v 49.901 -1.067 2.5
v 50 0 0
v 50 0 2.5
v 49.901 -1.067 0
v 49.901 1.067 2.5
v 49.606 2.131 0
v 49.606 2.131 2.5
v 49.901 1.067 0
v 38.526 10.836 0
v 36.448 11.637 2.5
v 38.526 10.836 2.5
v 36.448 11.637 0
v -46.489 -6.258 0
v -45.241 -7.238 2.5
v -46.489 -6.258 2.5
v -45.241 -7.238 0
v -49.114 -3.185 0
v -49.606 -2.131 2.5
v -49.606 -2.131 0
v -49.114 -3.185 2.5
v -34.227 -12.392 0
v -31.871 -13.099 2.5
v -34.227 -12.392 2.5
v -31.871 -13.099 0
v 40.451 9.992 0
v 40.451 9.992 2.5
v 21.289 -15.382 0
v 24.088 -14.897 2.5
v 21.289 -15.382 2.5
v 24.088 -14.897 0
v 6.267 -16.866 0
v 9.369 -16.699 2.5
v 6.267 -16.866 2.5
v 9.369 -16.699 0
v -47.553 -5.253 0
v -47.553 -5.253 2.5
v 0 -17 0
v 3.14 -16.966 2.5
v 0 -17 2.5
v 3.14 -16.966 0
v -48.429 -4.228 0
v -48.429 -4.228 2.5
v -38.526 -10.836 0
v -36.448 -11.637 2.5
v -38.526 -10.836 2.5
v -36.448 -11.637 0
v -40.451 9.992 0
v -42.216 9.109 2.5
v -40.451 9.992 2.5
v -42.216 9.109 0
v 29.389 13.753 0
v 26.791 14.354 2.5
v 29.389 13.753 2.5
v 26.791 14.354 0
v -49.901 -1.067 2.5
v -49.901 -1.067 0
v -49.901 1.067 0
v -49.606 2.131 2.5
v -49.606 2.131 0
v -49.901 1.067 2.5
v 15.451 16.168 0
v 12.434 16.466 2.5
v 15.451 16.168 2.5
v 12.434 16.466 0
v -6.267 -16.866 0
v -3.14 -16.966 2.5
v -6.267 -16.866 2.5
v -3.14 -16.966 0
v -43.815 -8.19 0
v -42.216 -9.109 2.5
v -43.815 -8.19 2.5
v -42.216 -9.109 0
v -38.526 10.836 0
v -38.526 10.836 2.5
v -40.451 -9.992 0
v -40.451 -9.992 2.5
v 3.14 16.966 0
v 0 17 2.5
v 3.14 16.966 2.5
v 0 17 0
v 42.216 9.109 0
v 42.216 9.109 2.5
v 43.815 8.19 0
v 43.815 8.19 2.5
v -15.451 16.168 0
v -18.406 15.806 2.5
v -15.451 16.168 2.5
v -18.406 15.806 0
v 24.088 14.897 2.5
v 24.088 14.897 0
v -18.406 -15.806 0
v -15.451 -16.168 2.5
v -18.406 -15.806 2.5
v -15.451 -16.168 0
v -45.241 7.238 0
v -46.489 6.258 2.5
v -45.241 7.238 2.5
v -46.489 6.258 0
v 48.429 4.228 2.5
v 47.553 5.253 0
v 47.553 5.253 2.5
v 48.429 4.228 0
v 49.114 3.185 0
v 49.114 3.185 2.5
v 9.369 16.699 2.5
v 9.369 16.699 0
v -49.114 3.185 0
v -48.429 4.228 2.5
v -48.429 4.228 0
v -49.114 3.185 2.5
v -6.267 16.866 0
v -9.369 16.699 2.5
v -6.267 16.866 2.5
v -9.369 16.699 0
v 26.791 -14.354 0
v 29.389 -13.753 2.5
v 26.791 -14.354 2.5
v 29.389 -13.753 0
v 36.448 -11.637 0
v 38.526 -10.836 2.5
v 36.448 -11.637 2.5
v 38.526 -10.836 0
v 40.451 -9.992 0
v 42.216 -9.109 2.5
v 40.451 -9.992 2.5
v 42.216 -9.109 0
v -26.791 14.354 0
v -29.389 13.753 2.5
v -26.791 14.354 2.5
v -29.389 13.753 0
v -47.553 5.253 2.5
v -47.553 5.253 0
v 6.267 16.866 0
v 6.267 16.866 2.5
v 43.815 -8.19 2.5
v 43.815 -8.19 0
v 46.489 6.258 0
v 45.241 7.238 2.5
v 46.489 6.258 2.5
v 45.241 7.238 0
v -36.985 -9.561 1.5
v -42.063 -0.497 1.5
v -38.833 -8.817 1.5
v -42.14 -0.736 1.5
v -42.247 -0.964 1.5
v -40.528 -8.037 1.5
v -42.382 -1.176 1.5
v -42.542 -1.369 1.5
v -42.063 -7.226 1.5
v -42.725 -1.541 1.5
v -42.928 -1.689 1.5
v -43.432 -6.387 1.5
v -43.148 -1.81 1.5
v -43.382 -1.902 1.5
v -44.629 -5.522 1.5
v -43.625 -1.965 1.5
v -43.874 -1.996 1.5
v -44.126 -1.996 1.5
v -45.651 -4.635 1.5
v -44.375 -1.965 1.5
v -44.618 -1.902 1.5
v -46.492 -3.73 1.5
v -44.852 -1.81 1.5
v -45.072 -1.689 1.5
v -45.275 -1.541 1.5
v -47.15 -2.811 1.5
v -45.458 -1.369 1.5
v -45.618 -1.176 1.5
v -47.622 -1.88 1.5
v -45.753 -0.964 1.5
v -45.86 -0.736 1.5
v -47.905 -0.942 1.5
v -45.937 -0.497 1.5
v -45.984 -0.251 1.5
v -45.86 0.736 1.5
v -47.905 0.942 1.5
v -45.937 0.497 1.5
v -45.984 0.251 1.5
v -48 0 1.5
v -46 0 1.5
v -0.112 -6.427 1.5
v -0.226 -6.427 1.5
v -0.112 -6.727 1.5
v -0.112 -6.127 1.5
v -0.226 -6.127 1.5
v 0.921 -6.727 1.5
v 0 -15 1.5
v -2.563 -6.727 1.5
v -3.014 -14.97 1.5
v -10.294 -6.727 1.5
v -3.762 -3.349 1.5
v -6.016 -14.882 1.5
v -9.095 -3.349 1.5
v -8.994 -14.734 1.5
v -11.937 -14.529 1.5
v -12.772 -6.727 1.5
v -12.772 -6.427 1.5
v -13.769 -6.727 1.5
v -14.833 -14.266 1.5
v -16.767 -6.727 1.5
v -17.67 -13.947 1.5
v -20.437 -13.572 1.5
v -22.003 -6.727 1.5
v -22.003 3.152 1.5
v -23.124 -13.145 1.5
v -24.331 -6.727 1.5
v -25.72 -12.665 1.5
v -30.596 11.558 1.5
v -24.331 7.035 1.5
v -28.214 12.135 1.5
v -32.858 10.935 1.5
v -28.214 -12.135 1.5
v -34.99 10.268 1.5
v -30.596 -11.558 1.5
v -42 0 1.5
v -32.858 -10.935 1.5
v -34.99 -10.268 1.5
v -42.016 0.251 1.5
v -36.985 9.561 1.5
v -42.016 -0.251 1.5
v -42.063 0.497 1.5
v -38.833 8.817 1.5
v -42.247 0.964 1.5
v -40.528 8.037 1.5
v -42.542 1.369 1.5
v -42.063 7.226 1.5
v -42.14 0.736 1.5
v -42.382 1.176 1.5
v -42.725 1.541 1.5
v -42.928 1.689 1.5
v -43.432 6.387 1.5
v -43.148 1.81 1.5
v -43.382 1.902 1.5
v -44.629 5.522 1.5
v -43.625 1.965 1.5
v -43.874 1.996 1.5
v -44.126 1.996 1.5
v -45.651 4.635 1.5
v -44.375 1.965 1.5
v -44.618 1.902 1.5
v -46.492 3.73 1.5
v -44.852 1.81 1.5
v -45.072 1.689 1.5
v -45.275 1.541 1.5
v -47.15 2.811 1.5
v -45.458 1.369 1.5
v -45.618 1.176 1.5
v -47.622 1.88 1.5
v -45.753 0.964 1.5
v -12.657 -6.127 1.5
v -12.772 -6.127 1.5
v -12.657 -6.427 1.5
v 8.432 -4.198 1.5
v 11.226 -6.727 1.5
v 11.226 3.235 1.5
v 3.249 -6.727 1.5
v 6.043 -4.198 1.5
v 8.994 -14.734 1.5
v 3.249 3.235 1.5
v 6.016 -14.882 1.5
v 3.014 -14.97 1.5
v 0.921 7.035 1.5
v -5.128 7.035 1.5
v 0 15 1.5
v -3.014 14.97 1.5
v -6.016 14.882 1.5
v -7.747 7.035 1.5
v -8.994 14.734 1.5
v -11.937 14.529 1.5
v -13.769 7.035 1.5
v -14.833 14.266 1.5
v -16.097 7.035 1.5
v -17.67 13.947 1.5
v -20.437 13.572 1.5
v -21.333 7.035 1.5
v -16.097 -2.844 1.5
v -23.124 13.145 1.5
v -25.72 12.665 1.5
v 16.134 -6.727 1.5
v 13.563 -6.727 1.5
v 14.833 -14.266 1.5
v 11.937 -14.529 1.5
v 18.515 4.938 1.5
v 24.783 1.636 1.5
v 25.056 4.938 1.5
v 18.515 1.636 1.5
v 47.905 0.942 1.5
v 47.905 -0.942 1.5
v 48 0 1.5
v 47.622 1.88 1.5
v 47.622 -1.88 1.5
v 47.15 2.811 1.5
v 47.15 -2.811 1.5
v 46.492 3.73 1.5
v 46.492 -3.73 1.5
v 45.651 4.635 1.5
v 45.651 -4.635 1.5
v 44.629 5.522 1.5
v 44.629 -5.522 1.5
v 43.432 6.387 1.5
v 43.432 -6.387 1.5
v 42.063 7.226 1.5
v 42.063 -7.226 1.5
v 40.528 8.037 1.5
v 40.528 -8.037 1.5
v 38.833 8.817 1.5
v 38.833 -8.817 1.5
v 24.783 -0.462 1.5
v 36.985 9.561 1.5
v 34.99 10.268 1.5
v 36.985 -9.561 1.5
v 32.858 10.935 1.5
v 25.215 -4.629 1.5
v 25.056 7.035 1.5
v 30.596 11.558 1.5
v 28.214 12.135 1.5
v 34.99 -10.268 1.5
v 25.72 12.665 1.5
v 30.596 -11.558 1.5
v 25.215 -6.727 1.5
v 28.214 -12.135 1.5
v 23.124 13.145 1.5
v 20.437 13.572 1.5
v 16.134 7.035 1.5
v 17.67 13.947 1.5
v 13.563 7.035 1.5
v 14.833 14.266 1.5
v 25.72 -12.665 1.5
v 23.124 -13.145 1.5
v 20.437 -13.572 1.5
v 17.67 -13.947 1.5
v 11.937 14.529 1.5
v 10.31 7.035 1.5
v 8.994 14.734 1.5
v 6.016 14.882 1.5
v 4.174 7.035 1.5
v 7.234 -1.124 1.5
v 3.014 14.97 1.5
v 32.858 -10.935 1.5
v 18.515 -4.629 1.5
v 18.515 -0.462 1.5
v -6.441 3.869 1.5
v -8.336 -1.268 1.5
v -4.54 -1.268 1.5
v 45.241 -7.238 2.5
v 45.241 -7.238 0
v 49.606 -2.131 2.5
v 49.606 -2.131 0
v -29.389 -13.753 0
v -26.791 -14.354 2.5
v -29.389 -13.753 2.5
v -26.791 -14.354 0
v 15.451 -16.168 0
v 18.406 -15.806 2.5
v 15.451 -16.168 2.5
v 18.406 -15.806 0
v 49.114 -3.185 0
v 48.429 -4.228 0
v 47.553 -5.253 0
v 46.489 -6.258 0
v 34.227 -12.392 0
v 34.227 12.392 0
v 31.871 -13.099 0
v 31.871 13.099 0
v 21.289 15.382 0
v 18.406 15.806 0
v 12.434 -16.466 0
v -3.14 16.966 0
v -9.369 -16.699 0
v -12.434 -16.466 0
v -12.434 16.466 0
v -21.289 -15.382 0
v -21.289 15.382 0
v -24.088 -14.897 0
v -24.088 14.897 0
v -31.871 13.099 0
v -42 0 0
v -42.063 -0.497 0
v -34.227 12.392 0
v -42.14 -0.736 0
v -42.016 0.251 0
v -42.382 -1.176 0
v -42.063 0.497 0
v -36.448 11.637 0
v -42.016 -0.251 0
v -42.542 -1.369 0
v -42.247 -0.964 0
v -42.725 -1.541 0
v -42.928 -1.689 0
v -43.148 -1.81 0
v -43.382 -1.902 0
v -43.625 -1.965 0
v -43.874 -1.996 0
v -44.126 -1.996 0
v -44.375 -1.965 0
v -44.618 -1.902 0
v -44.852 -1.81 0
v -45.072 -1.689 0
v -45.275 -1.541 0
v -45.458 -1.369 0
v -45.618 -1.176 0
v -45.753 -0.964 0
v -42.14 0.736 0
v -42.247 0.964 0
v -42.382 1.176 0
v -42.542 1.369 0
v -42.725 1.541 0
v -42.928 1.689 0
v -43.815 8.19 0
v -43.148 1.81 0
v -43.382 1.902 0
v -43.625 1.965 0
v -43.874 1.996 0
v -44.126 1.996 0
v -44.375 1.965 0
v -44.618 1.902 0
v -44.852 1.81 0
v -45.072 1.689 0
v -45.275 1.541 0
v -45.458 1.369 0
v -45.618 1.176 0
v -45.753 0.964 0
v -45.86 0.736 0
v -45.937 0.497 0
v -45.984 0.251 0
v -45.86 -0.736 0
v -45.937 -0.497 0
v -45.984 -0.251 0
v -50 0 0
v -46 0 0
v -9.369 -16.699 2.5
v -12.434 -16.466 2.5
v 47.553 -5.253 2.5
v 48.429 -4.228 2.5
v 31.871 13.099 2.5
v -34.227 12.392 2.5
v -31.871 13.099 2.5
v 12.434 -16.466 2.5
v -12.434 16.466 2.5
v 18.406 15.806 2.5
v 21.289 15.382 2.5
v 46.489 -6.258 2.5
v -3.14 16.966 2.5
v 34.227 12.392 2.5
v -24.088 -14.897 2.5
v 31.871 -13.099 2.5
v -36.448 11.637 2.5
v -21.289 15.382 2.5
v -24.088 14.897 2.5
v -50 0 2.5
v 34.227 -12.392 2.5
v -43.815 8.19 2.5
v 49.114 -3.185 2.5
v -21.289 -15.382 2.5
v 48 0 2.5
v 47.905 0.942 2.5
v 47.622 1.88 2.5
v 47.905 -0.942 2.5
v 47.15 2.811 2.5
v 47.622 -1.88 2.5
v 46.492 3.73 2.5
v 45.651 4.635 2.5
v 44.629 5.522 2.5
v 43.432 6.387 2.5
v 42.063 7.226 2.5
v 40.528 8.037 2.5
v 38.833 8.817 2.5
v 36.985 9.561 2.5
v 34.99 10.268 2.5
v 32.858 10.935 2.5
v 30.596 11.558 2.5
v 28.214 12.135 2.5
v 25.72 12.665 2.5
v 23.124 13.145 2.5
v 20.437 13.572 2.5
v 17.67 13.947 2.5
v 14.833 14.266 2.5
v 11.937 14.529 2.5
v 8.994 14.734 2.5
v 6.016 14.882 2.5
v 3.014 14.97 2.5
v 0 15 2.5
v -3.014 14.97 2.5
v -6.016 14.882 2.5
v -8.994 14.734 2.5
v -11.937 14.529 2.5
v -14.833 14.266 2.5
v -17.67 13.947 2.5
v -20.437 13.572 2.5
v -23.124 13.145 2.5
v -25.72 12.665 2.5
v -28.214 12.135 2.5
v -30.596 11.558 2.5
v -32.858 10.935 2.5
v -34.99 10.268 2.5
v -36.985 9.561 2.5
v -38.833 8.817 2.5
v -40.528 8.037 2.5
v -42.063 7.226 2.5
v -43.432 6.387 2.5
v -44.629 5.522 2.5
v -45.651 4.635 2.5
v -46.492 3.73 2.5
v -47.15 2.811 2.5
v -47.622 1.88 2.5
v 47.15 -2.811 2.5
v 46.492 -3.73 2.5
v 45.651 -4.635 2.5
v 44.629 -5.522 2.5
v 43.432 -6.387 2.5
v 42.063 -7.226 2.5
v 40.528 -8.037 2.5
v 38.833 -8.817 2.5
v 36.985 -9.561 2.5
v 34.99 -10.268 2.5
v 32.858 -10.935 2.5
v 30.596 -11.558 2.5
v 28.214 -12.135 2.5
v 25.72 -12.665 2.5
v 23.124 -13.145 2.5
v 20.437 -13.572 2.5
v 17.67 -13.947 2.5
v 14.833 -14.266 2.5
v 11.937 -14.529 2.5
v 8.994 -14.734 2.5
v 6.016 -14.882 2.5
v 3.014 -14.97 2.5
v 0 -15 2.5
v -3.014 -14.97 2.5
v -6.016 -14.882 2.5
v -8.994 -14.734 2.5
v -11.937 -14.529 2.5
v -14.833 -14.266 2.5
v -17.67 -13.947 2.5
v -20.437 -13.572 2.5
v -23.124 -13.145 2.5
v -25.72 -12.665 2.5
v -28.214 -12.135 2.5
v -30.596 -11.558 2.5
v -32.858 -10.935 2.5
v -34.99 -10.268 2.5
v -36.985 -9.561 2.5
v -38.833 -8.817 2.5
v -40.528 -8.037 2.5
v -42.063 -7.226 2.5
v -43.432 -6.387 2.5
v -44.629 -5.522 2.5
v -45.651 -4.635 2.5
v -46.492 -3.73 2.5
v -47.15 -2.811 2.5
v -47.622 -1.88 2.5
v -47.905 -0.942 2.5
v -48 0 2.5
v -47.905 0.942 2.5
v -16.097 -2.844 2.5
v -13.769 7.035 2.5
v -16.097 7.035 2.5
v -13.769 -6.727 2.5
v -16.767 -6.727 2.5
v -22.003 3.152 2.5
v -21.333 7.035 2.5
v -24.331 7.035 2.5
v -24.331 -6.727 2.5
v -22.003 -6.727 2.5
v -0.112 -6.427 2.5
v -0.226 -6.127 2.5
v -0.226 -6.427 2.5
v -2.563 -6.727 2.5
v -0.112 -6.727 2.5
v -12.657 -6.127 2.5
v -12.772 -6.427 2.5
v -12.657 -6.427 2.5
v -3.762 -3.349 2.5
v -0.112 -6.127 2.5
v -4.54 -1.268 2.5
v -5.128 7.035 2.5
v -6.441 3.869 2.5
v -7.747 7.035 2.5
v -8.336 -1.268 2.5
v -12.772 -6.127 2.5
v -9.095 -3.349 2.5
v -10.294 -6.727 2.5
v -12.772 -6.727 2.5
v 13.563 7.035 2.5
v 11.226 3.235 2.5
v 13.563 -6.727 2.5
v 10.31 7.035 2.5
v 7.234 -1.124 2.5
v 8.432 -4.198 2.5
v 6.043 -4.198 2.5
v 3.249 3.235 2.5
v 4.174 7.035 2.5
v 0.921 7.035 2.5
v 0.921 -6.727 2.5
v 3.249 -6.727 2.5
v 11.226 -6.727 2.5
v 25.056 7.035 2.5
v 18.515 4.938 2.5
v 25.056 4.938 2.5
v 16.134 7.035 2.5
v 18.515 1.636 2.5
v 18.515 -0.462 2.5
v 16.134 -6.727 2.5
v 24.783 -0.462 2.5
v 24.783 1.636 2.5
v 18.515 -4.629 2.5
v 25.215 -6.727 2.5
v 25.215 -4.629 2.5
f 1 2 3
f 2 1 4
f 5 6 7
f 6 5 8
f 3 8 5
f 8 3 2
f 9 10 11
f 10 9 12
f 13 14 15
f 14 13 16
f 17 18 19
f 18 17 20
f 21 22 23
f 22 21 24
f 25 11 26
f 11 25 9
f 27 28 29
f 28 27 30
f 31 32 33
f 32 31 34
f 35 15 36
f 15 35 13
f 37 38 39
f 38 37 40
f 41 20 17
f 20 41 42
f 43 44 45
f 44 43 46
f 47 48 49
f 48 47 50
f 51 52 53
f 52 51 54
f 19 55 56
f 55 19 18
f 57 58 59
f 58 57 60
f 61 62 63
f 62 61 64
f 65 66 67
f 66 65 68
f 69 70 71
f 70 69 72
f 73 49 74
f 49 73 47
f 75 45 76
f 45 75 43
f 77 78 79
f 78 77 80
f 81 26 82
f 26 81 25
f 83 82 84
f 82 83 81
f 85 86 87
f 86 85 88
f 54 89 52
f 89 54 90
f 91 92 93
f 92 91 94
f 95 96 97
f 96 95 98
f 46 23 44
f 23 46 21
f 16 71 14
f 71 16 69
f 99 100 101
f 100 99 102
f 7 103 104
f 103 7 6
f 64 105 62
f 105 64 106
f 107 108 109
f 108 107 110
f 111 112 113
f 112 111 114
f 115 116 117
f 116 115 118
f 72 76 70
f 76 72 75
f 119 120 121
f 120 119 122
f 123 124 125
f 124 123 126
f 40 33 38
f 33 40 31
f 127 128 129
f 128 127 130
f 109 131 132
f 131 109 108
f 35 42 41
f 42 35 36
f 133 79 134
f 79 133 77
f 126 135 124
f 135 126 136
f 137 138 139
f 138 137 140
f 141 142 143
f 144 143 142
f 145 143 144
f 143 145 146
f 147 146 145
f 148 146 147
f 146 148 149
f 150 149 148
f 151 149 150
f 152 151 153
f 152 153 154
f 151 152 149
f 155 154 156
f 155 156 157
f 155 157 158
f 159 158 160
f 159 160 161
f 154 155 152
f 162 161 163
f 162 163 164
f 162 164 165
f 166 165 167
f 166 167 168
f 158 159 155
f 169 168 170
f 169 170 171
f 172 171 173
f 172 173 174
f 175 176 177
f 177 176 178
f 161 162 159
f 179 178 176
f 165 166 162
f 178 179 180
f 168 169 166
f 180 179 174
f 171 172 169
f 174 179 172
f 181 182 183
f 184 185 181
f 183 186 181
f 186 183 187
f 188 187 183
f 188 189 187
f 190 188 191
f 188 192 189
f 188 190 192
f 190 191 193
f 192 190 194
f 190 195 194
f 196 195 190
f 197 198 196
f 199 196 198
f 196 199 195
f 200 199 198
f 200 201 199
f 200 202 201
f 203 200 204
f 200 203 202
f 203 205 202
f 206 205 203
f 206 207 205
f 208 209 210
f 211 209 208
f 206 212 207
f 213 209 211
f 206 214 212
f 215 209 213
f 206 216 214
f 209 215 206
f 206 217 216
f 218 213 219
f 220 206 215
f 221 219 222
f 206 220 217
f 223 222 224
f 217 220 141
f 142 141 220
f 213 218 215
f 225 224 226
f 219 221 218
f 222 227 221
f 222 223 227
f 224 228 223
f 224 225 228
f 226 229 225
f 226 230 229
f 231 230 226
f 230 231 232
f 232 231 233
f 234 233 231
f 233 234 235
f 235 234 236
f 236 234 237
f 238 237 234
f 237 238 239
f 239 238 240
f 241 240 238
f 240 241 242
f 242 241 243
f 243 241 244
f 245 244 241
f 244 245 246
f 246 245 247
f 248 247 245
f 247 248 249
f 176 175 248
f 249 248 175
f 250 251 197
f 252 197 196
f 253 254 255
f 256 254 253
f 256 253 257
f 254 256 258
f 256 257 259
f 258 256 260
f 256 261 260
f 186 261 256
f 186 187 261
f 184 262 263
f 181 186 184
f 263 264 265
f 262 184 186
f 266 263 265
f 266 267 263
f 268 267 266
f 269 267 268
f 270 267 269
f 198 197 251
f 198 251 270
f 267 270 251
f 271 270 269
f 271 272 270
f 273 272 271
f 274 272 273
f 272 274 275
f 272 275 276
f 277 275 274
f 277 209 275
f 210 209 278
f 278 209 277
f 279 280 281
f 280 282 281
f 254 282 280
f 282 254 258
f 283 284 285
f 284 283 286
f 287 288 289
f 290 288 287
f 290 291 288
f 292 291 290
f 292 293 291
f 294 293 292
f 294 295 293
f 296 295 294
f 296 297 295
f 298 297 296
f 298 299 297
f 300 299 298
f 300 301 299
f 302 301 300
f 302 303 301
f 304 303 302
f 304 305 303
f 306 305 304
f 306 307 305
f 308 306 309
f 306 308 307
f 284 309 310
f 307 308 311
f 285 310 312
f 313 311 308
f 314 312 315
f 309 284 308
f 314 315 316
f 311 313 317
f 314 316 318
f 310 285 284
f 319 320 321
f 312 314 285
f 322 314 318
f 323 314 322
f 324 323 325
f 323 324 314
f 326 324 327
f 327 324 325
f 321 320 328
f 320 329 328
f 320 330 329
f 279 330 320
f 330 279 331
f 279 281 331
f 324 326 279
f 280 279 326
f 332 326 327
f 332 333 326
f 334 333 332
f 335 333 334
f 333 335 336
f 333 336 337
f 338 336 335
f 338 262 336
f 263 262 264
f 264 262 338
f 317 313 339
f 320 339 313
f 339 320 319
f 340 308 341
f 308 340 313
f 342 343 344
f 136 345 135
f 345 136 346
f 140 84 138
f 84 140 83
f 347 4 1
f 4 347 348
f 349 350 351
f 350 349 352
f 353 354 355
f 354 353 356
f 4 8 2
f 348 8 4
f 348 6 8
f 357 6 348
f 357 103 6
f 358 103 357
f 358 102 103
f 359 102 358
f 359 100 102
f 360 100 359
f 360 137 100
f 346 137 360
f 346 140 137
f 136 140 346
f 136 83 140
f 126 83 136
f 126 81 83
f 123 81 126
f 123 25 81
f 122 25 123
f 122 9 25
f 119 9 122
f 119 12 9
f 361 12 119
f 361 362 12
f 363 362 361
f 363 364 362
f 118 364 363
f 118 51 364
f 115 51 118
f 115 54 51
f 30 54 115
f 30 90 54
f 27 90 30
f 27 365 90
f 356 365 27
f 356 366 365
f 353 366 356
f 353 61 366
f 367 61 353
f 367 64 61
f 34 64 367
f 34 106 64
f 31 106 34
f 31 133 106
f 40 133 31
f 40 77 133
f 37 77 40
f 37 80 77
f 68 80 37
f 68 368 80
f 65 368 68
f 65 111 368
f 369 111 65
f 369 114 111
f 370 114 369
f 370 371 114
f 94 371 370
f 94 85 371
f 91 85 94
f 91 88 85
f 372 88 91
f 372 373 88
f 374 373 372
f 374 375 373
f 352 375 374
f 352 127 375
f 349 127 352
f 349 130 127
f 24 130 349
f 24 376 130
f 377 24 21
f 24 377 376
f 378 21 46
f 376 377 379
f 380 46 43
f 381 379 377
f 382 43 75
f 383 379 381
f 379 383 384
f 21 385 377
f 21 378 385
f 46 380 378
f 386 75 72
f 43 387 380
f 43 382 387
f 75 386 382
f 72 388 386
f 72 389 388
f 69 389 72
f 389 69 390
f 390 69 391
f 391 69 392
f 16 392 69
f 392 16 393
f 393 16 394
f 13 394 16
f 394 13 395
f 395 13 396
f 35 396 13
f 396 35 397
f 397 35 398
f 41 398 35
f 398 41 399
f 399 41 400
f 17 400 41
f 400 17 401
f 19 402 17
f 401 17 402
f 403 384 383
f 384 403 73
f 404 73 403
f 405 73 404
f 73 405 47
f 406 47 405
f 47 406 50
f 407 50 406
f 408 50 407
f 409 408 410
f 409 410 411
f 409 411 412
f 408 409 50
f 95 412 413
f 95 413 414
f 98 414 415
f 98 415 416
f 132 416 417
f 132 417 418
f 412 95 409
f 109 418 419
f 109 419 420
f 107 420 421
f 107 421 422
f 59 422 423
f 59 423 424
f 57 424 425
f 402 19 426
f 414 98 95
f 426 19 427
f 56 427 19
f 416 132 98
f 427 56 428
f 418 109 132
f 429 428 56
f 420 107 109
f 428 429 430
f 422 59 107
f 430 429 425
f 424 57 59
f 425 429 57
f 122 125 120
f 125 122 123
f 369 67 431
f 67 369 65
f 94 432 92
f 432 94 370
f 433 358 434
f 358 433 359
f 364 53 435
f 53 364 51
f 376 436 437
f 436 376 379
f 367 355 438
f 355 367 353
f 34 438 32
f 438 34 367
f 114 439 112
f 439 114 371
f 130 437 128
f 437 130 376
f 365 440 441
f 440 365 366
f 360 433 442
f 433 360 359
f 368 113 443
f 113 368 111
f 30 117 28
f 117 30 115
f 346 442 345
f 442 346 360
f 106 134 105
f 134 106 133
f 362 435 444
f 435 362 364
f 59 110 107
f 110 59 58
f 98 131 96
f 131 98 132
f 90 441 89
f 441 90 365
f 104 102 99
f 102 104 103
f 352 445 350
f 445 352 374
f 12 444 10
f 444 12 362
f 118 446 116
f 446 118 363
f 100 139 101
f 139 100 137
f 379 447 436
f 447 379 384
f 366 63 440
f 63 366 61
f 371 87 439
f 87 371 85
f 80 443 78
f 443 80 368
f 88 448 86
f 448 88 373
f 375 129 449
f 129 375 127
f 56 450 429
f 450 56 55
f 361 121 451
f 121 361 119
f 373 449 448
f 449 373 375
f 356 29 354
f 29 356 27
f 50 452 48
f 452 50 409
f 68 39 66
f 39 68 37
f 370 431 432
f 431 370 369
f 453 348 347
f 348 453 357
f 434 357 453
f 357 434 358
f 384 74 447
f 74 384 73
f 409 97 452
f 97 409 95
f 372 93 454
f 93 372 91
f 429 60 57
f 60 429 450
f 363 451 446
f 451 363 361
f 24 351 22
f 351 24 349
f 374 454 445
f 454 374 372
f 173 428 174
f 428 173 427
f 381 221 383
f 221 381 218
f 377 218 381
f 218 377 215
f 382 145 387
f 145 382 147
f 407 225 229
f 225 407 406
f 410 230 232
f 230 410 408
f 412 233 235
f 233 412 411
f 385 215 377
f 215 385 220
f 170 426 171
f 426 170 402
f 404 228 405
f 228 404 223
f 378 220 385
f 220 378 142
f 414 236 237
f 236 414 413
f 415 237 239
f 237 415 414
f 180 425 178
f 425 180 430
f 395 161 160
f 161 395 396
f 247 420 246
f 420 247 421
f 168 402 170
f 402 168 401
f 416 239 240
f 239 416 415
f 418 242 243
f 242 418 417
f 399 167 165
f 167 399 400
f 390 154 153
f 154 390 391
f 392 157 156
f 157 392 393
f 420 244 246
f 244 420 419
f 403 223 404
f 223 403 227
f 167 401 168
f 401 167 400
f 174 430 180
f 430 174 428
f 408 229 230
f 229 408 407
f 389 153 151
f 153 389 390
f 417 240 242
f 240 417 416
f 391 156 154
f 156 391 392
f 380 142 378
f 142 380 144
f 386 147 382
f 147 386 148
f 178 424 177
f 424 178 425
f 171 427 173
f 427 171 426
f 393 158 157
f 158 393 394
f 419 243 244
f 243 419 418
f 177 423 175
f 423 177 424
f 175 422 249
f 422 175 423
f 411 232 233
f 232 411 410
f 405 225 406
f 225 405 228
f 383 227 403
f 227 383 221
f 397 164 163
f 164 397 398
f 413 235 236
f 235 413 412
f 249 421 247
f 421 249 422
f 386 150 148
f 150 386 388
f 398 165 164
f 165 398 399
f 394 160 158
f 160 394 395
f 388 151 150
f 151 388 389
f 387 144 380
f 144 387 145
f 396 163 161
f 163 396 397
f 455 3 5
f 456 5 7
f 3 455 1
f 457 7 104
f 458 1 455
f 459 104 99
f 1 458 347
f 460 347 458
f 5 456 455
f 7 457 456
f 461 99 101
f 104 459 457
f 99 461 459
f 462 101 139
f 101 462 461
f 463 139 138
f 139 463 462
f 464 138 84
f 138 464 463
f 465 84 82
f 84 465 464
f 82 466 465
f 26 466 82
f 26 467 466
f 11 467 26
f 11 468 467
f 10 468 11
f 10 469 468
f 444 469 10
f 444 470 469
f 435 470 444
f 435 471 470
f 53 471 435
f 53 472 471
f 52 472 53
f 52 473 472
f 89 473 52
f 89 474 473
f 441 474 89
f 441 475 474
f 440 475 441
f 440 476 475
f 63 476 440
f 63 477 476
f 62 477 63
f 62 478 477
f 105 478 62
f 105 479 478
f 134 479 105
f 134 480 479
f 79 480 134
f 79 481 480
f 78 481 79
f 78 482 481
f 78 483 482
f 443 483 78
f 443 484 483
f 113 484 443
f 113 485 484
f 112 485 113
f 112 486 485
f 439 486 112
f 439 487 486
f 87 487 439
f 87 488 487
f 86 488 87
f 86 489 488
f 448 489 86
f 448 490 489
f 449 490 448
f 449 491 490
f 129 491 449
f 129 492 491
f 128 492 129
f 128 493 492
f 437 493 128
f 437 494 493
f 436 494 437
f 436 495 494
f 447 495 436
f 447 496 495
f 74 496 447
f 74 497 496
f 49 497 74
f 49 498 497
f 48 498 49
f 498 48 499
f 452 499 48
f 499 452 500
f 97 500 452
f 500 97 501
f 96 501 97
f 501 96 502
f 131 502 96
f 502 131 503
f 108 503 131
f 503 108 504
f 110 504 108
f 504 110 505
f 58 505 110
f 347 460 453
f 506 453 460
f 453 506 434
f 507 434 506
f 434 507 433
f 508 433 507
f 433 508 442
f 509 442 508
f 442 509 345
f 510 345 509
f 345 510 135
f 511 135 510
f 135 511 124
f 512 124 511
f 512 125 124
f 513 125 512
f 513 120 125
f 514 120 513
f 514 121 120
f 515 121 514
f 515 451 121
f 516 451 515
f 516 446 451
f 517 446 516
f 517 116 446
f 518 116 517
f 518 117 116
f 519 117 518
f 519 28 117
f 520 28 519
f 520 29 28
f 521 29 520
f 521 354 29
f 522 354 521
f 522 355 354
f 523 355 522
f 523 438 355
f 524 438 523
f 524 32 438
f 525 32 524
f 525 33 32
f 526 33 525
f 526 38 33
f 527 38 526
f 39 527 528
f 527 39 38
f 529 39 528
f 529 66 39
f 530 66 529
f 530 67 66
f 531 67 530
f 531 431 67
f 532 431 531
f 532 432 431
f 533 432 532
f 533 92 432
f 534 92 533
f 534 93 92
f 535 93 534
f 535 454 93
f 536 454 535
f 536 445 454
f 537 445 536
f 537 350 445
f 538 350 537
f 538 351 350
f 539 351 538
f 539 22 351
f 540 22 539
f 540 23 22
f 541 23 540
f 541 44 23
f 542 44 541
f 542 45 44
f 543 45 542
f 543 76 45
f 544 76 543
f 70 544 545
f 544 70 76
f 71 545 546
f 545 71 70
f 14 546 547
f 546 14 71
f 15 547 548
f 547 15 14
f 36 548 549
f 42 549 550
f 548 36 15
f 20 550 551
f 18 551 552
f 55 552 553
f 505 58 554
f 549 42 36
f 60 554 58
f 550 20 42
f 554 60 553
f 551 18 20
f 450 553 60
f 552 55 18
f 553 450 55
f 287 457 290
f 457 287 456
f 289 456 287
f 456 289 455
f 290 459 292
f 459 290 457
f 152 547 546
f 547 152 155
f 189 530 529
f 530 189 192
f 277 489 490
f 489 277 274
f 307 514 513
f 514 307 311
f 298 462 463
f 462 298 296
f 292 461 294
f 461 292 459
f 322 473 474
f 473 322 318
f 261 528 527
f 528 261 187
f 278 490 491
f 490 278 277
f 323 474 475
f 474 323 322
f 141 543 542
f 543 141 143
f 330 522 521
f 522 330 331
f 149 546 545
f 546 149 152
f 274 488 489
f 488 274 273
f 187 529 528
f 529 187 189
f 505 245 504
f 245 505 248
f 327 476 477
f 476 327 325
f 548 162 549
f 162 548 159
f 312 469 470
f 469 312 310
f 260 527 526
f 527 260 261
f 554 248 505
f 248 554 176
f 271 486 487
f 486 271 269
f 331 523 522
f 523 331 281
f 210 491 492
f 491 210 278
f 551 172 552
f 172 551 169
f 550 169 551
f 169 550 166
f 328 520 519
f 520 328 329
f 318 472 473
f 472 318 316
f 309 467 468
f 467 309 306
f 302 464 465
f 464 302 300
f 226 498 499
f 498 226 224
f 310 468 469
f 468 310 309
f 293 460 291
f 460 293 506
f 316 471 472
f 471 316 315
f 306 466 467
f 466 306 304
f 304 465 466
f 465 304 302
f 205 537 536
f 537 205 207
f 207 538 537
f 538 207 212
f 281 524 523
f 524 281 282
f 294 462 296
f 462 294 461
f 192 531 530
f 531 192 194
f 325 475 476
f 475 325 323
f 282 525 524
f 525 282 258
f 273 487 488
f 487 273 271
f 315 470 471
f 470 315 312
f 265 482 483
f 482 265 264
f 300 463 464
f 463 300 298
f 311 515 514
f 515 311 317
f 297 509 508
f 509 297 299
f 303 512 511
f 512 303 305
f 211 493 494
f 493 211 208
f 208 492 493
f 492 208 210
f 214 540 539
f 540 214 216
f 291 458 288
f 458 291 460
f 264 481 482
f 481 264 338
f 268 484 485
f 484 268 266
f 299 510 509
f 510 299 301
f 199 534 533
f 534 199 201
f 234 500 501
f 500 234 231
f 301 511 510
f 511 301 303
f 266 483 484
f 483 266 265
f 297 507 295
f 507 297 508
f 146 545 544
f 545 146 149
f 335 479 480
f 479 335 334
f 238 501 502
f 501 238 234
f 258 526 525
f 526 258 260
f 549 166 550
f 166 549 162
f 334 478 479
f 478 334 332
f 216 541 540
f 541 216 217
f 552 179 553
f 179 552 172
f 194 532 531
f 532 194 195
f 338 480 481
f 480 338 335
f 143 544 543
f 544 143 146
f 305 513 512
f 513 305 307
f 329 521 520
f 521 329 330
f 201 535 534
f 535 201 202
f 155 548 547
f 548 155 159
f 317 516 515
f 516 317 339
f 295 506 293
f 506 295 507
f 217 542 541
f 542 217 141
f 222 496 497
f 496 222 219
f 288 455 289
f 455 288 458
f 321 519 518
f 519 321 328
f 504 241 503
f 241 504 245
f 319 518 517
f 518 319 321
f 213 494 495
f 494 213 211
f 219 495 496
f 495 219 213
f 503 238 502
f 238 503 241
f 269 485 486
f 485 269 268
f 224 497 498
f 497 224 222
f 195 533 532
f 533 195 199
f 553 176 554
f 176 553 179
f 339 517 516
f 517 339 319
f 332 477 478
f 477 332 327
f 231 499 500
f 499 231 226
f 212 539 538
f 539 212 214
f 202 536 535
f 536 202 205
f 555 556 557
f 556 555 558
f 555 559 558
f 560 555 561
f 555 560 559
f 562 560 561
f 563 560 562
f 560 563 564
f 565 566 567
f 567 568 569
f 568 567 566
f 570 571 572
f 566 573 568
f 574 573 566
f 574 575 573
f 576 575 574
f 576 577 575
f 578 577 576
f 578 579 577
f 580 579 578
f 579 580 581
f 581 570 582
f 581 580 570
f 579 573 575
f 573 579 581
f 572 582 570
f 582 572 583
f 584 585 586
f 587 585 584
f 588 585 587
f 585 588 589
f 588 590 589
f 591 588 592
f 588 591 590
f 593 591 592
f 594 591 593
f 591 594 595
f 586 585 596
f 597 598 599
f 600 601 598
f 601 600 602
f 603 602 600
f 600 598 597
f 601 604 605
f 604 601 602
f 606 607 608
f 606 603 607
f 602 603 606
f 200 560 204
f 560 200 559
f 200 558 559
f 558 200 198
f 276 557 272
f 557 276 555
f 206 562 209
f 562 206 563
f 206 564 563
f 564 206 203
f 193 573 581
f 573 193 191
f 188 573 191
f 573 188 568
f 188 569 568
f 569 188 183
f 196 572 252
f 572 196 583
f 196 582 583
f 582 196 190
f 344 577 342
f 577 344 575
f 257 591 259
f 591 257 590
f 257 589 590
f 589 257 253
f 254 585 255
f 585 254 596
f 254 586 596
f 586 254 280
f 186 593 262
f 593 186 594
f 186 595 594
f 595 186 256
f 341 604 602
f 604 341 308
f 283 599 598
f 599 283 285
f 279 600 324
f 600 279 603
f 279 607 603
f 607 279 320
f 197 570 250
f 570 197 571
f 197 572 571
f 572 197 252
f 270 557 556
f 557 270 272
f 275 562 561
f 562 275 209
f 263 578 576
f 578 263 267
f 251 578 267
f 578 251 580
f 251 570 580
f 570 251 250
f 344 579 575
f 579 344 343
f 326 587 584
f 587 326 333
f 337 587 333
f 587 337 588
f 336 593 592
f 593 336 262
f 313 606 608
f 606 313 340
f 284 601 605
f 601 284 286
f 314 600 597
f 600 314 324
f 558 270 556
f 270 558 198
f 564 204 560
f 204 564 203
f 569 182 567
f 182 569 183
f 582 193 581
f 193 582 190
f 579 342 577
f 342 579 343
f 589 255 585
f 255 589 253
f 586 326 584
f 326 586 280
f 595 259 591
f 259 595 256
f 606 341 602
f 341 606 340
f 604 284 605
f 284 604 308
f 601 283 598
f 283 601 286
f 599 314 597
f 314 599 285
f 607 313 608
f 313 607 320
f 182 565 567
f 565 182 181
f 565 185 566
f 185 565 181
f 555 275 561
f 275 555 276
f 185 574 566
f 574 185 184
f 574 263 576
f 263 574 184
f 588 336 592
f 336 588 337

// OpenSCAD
// Single-Layer Oval Zipper Pull Template with Raised Text
// Creates a blue base oval with raised white text and a hole for zipper attachment

// Parameters - these can be overridden from command line
name = "NAME"; // Text to display on zipper pull
oval_width = 96; // Width of blue oval (mm) - total with border will be 100mm (96 + 2*2)
oval_height = 30; // Height of blue oval (mm) - total with border will be 34mm (30 + 2*2)
base_thickness = 1.5; // Thickness of blue base layer (mm)
text_thickness = 1; // Thickness of raised white text (mm)
base_text_size = 13; // Base font size for medium names
font_file = "C:/Users/Fred/claude/Fordscript.ttf"; // Path to the custom font file

// Dynamic font sizing based on name length (mimics Ford oval proportions)
// "Fred" (4 chars) at 13mm gives ~20% coverage - our target
name_length = len(name);
text_size = name_length <= 3 ? 18 :      // Short names (Zoe, Sam, Al) - larger (~21% coverage)
            name_length <= 5 ? 13 :      // Medium names (Fred, John, Mary) - standard (~20% coverage)
            name_length <= 8 ? 11 :      // Longer names (Michael, Jessica) - smaller (~25% coverage)
            11;                          // Very long names (Christopher) - increased to 11mm (~35% coverage)

// Border parameters
border_width = 2; // Width of the white border around the oval (mm)
border_thickness = 1; // Thickness of the white border (mm)

// Hole parameters for zipper pull
hole_diameter = 4; // Diameter of the hole (mm)
hole_clearance = 4; // Minimum clearance from edge of outer border (mm) - increased to fully clear white border

// Module to create an oval (ellipse)
module oval(width, height, depth) {
    scale([width/2, height/2, 1])
        cylinder(h=depth, r=1, $fn=100);
}

// Blue base layer with hole
module base_layer() {
    color("RoyalBlue")
    difference() {
        // Blue base matches the outer size of the white border
        oval(oval_width + border_width*2, oval_height + border_width*2, base_thickness);

        // Hole for zipper pull - positioned relative to outer edge
        // Total width = oval_width + border_width*2
        // Position: left edge + hole_radius + clearance
        total_width = oval_width + border_width*2;
        hole_x = -(total_width/2) + (hole_diameter/2) + hole_clearance;
        translate([hole_x, 0, -0.05])
            cylinder(h=base_thickness + 0.1, d=hole_diameter, $fn=50);
    }
}

// White border around the oval
module white_border() {
    color("white")
    translate([0, 0, base_thickness])
        difference() {
            // Outer oval (larger)
            oval(oval_width + border_width*2, oval_height + border_width*2, border_thickness);
            // Inner oval (cut out the center)
            translate([0, 0, -0.05])
                oval(oval_width, oval_height, border_thickness + 0.1);
        }
}

// Raised white text on top of base
module raised_text() {
    color("white")
    // Multiple offset renders create a "fake bold" effect
    for (x = [-0.3, 0, 0.3]) {
        for (y = [-0.3, 0, 0.3]) {
            translate([x, y, base_thickness])
                linear_extrude(height=text_thickness)
                    text(name,
                         size=text_size,
                         font="Fordscript",
                         halign="center",
                         valign="center");
        }
    }
}

// Main zipper pull assembly
module zipper_pull() {
    base_layer();
    white_border();
    raised_text();
}

// Generate the zipper pull
zipper_pull();
